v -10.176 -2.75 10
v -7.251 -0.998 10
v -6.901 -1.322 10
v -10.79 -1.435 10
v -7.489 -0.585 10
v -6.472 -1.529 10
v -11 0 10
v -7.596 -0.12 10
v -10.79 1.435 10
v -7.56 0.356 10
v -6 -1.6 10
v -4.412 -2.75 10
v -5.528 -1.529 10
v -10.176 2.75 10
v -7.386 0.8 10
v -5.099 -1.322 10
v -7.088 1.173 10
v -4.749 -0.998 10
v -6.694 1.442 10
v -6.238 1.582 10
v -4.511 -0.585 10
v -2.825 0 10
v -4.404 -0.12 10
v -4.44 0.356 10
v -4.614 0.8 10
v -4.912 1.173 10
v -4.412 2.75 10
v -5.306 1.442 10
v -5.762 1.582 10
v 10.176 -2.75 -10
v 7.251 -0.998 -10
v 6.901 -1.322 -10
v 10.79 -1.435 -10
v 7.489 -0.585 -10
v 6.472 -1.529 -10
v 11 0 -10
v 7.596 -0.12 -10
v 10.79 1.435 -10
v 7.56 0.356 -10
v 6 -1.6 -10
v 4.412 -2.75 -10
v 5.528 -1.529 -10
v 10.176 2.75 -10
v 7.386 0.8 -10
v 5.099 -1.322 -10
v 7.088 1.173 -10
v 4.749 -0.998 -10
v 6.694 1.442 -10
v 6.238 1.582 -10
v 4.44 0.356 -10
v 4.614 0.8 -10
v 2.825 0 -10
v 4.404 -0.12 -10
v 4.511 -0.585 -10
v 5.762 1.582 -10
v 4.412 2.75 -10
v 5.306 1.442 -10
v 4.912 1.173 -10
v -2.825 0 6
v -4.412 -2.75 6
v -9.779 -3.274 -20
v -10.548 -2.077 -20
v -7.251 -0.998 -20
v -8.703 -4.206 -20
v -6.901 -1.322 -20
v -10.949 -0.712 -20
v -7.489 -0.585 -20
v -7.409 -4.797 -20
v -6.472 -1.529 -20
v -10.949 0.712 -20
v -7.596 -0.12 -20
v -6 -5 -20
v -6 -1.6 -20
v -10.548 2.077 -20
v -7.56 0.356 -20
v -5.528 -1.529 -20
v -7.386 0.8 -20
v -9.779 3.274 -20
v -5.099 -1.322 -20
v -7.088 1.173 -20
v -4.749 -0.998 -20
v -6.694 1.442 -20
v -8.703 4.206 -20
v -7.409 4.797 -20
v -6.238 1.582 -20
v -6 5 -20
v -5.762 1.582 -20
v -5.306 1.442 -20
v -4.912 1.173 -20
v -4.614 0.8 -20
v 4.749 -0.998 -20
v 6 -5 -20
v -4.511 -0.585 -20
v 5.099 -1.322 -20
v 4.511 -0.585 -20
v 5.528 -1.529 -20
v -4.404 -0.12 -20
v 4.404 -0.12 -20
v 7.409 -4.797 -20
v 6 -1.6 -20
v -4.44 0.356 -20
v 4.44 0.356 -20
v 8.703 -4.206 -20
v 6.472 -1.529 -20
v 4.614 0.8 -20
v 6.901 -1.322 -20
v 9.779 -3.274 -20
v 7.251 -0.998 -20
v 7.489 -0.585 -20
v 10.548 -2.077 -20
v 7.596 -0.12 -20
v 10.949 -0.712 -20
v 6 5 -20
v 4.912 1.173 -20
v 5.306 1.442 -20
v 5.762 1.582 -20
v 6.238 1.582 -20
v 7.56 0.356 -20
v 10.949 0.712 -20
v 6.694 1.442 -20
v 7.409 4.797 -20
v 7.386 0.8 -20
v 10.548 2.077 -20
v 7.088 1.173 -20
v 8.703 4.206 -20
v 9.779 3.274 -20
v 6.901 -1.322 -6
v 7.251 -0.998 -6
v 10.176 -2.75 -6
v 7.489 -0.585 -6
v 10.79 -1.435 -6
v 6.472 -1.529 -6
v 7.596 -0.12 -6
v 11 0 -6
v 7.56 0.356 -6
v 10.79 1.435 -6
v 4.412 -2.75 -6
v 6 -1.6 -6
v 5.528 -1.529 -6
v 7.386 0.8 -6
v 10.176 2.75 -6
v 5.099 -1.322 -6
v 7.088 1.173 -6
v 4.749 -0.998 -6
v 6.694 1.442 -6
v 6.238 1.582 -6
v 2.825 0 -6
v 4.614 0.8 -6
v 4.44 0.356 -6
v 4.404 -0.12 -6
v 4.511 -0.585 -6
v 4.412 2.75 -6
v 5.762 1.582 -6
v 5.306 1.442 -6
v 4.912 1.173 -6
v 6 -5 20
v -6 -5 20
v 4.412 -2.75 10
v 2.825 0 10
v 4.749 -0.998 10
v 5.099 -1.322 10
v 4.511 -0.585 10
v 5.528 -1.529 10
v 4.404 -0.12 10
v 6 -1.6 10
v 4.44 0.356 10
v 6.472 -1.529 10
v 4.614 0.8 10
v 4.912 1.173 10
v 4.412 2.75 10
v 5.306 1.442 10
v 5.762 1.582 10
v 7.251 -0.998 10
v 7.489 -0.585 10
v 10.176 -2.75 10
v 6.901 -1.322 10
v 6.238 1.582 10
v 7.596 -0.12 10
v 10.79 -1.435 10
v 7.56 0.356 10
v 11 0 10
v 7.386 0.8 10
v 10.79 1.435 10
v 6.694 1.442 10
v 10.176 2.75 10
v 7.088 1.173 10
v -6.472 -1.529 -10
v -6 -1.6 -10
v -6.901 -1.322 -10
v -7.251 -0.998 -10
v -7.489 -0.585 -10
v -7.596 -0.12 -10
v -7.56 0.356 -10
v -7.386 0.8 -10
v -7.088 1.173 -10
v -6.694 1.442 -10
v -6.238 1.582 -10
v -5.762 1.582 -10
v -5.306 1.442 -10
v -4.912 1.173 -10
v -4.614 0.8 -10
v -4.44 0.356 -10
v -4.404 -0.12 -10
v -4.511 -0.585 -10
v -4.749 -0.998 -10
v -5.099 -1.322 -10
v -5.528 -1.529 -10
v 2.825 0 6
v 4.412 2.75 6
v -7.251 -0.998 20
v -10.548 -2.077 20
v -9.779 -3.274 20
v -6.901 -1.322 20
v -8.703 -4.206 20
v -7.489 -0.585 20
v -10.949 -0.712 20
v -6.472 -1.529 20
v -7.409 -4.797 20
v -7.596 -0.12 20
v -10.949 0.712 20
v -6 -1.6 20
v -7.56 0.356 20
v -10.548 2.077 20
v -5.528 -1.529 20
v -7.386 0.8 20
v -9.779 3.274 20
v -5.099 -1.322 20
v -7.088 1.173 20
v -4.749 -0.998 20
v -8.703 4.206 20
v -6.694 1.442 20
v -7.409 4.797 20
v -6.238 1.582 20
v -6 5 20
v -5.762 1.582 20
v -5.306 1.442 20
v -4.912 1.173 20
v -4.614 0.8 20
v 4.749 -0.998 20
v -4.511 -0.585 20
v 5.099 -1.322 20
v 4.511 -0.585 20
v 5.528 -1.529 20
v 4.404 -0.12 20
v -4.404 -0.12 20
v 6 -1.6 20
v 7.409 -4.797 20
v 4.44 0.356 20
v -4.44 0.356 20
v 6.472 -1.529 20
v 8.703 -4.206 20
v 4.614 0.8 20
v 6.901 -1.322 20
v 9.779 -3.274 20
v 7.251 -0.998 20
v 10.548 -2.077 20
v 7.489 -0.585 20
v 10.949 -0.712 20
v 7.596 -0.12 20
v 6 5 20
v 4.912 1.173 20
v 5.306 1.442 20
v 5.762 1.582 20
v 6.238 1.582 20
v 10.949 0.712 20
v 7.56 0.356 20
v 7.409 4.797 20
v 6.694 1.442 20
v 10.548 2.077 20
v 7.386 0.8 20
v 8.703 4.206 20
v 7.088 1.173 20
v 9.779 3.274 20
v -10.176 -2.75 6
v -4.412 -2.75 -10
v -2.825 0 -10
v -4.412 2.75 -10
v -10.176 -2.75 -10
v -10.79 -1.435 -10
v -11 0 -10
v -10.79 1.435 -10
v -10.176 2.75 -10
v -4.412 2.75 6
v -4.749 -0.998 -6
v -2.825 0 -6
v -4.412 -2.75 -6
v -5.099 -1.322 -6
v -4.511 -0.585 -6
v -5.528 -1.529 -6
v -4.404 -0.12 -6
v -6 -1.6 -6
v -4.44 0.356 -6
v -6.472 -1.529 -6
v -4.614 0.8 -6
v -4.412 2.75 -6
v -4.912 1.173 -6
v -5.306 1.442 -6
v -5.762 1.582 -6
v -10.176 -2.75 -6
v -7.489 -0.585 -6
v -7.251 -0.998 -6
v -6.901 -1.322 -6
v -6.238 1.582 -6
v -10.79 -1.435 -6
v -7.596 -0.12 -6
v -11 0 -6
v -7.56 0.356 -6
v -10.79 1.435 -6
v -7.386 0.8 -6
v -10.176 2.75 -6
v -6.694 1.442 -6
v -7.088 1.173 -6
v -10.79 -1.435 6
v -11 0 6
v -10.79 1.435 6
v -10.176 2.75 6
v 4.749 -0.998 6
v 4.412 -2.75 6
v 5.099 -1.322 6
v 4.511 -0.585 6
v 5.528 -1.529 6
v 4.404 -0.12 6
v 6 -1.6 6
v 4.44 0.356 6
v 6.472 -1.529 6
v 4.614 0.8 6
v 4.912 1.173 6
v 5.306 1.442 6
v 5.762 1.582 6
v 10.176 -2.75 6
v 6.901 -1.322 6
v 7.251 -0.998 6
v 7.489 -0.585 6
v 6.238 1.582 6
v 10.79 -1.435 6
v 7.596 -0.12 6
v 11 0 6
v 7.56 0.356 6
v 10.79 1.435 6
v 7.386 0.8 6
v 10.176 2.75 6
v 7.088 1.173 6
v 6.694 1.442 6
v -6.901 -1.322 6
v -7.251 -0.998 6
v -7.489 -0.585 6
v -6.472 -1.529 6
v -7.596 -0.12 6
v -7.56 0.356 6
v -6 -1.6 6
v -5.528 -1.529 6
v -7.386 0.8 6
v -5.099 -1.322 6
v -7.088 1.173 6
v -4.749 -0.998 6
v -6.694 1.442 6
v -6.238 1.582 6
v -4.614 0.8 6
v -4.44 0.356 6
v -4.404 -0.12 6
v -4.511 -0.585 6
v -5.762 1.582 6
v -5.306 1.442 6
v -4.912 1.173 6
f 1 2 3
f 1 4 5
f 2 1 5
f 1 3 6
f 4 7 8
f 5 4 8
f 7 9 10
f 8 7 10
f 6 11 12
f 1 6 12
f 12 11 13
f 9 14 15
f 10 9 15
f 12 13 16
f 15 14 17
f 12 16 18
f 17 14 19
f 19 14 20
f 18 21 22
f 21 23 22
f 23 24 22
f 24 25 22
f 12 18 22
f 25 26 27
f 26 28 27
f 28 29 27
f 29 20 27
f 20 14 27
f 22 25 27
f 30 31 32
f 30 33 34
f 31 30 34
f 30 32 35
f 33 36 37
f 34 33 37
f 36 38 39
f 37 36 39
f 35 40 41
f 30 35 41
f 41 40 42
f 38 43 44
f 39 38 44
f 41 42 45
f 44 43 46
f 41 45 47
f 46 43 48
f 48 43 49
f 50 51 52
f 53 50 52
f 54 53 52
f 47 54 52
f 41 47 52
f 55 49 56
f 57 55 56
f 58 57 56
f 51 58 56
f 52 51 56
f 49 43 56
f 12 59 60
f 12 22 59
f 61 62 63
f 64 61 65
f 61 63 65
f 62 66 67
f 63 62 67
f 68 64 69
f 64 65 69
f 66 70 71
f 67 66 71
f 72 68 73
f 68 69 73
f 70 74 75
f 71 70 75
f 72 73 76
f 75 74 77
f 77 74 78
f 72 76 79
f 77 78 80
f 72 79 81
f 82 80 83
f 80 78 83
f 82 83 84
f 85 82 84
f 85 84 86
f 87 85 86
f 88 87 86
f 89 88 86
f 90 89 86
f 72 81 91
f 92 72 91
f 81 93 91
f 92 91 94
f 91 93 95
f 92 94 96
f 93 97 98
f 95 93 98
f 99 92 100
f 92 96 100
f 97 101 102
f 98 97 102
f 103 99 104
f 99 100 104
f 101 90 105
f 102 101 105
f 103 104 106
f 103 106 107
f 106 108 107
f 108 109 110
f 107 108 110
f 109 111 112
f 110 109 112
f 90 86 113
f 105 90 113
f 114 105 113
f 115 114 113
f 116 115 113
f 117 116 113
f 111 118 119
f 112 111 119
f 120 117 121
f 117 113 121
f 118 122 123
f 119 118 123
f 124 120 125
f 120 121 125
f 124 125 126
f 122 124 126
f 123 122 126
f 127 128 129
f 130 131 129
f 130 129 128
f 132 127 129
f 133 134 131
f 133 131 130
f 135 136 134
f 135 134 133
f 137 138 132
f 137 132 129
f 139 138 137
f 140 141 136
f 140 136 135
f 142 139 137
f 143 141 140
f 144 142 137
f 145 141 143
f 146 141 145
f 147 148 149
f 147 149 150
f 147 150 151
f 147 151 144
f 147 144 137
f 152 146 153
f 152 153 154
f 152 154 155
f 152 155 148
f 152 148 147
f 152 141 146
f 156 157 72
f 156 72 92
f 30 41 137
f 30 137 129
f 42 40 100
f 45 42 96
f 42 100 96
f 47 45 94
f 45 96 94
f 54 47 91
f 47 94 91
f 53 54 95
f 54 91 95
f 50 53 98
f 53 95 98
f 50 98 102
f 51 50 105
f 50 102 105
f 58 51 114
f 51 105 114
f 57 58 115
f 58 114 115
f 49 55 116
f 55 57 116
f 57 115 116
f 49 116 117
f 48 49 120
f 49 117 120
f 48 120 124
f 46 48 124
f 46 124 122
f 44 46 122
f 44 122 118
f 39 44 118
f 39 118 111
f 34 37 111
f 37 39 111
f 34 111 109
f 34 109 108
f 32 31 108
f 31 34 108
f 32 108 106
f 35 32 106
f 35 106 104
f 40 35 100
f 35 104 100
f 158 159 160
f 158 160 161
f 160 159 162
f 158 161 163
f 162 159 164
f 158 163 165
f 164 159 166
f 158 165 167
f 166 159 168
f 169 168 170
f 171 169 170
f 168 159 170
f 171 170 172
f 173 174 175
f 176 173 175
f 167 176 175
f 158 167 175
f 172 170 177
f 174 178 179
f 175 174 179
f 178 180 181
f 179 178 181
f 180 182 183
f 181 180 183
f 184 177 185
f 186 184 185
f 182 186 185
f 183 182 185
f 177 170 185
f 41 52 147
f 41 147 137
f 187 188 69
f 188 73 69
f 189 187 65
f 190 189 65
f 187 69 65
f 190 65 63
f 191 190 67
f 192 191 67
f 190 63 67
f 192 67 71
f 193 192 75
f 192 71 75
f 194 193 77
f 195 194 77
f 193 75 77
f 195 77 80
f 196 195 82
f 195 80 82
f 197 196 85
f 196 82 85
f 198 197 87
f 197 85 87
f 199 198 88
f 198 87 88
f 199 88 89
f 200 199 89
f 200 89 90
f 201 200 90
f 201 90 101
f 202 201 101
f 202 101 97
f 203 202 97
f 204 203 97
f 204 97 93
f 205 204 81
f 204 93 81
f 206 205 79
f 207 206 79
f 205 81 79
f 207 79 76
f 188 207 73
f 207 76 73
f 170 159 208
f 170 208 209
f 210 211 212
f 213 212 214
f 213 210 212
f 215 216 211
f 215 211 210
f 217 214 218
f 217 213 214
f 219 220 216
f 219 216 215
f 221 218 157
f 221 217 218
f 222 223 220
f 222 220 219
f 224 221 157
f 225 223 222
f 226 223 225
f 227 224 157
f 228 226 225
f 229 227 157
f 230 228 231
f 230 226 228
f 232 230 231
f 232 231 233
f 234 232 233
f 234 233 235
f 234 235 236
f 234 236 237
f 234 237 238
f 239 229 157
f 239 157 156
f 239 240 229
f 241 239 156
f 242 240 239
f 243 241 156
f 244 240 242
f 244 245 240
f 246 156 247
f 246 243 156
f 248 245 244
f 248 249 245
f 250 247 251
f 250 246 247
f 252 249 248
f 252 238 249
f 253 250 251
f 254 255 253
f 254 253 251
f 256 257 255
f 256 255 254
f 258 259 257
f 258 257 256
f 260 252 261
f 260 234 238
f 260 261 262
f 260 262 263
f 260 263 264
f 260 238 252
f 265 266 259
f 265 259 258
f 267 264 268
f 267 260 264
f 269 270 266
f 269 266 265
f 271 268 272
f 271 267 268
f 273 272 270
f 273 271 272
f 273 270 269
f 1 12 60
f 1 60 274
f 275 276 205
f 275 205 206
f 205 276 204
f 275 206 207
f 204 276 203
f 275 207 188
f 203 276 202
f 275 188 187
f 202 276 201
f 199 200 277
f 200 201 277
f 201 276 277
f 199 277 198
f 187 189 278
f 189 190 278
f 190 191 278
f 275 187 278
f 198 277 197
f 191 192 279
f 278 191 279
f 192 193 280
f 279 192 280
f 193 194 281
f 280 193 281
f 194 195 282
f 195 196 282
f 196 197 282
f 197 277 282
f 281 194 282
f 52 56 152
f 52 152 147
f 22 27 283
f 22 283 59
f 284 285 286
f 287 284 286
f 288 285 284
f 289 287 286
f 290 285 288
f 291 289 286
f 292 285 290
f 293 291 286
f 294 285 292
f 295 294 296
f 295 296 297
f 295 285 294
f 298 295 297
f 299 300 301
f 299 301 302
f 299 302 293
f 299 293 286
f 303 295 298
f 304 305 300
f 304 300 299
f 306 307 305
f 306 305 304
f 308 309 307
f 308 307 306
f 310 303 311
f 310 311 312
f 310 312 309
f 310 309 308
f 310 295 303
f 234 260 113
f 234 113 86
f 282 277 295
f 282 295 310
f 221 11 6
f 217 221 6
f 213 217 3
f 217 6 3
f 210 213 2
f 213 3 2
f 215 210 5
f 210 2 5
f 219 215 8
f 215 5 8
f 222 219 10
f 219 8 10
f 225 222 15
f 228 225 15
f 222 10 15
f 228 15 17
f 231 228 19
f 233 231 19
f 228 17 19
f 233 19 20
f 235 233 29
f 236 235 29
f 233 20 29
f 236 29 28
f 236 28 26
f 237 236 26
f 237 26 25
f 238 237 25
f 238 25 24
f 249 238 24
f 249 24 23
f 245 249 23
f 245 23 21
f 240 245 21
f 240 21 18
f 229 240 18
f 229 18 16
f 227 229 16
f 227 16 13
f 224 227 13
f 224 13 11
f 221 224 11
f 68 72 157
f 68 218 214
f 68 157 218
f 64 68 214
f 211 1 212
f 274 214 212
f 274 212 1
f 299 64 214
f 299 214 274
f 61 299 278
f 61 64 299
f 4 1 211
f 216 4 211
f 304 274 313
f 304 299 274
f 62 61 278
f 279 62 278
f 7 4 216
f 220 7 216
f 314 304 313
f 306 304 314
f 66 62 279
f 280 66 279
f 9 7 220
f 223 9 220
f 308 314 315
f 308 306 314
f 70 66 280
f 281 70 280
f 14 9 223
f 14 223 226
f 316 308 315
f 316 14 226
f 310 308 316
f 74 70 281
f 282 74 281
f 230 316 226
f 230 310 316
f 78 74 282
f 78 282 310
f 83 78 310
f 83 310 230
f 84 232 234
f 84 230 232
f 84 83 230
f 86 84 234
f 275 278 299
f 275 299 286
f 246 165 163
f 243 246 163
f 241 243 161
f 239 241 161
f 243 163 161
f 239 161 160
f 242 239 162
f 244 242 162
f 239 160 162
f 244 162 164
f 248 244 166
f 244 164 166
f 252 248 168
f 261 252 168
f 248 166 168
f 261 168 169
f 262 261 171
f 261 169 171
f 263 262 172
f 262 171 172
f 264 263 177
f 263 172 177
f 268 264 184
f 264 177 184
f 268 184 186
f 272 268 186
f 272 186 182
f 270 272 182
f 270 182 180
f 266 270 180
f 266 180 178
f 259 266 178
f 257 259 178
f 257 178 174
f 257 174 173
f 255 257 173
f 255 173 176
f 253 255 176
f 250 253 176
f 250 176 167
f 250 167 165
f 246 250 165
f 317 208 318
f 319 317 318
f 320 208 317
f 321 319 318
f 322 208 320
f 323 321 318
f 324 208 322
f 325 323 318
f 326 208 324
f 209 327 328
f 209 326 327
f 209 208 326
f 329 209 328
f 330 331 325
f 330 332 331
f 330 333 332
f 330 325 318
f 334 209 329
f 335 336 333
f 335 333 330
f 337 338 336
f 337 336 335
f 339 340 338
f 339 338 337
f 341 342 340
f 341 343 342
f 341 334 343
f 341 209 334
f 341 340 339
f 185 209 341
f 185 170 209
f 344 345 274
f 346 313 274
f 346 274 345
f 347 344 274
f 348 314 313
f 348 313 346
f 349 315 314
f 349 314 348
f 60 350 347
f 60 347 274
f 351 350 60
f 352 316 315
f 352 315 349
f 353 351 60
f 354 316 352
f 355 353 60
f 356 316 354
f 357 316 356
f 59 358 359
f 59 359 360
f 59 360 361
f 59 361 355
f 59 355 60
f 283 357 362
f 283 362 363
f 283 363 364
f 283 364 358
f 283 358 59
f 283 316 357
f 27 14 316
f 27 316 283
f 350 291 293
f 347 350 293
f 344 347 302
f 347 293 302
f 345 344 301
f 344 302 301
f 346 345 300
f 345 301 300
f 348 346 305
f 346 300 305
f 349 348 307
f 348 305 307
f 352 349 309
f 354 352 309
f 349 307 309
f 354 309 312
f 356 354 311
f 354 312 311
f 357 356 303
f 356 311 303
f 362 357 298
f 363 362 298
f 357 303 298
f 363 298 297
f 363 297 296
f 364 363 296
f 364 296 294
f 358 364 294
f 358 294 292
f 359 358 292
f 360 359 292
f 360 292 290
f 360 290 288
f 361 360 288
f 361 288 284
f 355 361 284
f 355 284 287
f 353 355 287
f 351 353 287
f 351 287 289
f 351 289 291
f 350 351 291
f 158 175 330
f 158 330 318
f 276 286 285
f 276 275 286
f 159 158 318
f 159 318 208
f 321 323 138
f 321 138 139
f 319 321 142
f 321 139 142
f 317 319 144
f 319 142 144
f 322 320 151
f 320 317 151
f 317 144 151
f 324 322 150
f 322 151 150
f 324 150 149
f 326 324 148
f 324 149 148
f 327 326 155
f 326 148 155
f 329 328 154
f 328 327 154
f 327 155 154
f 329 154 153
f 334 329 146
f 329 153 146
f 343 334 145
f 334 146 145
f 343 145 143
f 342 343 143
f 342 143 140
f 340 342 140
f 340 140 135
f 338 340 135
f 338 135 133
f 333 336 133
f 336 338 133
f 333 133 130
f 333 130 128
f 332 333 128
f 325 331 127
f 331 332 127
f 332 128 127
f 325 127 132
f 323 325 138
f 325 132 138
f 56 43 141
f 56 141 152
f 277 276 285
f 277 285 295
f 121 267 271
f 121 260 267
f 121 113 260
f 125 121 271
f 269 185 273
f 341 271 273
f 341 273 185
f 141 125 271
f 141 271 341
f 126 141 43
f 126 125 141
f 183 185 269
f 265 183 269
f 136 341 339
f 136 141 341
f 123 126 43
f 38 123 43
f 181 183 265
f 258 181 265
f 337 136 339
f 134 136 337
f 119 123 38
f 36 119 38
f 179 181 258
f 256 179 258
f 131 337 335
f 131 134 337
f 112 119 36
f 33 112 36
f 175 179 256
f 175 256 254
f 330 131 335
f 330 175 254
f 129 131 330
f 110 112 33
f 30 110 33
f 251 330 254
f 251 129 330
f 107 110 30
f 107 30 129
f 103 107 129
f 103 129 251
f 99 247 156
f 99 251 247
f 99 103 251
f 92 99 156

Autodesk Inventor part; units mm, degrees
ref_plane "YZ Plane" through (0, 0, 0) normal (1, 0, 0) x (0, 1, 0)
ref_plane "XZ Plane" through (0, 0, 0) normal (0, 1, 0) x (-1, 0, 0)
sketch "Sketch1" plane through (0, 0, 0) normal (0, 0, 1) x (1, 0, 0)
  line L0 (-6, 0) -> (6, 0) construction
  line L1 (-6, -5) -> (6, -5)
  line L2 (6, 5) -> (-6, 5)
  arc A0 (-6, 5) -> (-6, -5) centre (-6, 0) ccw
  arc A1 (6, -5) -> (6, 5) centre (6, 0) ccw
  point P0 (0, 0)
  point P1 (0, 0)
  dimension "d0" = 5
  dimension "d1" = 12
extrude "Extrusion1" add sketch "Sketch1" along normal mid plane 40
sketch "Sketch2" plane through (0, 0, 20) normal (0, 0, 1) x (1, 0, 0)
  arc A0 (-6, 5) -> (-6, -5) centre (-6, 0) ccw projected
  arc A1 (6, -5) -> (6, 5) centre (6, 0) ccw projected
  point P0 (0, 0)
hole "Hole1" at (-6, 0, 20) at (6, 0, 20) direction (0, 0, -1) diameter 3.2 end through all clearance for "Flat Head Machine Screw" size "M3" standard "Ansi Metric M Profile"
ref_plane "Work Plane1" through (0, 0, 10) normal (0, 0, 1) x (1, 0, 0)
sketch "Sketch3" plane through (0, 0, 10) normal (0, 0, 1) x (1, 0, 0)
  circle A0 centre (-6, 0) radius 1.6 projected
  line L0 (-7.5877, 2.75) -> (-4.4123, 2.75)
  line L1 (-4.4123, 2.75) -> (-2.8246, 0)
  line L2 (-2.8246, 0) -> (-4.4123, -2.75)
  line L3 (-4.4123, -2.75) -> (-7.5877, -2.75)
  line L4 (-7.5877, -2.75) -> (-9.1754, 0)
  line L5 (-9.1754, 0) -> (-7.5877, 2.75)
  line L6 (-7.5877, 2.75) -> (-10.1758, 2.75)
  arc A1 (-6, 5) -> (-6, -5) centre (-6, 0) ccw projected
  line L7 (-7.5877, -2.75) -> (-10.1758, -2.75)
  point P0 (0, 0)
  dimension "d12" = 5.5
extrude "Extrusion2" cut sketch "Sketch3" against normal blind 4
mirror "Mirror1" about plane through (0, 0, 0) normal (1, 0, 0) of "Extrusion2"
mirror "Mirror2" about plane through (0, 0, 0) normal (0, 0, 1) of "Extrusion2", "Mirror1"
properties part number "Standoff" material "ABS Plastic"
